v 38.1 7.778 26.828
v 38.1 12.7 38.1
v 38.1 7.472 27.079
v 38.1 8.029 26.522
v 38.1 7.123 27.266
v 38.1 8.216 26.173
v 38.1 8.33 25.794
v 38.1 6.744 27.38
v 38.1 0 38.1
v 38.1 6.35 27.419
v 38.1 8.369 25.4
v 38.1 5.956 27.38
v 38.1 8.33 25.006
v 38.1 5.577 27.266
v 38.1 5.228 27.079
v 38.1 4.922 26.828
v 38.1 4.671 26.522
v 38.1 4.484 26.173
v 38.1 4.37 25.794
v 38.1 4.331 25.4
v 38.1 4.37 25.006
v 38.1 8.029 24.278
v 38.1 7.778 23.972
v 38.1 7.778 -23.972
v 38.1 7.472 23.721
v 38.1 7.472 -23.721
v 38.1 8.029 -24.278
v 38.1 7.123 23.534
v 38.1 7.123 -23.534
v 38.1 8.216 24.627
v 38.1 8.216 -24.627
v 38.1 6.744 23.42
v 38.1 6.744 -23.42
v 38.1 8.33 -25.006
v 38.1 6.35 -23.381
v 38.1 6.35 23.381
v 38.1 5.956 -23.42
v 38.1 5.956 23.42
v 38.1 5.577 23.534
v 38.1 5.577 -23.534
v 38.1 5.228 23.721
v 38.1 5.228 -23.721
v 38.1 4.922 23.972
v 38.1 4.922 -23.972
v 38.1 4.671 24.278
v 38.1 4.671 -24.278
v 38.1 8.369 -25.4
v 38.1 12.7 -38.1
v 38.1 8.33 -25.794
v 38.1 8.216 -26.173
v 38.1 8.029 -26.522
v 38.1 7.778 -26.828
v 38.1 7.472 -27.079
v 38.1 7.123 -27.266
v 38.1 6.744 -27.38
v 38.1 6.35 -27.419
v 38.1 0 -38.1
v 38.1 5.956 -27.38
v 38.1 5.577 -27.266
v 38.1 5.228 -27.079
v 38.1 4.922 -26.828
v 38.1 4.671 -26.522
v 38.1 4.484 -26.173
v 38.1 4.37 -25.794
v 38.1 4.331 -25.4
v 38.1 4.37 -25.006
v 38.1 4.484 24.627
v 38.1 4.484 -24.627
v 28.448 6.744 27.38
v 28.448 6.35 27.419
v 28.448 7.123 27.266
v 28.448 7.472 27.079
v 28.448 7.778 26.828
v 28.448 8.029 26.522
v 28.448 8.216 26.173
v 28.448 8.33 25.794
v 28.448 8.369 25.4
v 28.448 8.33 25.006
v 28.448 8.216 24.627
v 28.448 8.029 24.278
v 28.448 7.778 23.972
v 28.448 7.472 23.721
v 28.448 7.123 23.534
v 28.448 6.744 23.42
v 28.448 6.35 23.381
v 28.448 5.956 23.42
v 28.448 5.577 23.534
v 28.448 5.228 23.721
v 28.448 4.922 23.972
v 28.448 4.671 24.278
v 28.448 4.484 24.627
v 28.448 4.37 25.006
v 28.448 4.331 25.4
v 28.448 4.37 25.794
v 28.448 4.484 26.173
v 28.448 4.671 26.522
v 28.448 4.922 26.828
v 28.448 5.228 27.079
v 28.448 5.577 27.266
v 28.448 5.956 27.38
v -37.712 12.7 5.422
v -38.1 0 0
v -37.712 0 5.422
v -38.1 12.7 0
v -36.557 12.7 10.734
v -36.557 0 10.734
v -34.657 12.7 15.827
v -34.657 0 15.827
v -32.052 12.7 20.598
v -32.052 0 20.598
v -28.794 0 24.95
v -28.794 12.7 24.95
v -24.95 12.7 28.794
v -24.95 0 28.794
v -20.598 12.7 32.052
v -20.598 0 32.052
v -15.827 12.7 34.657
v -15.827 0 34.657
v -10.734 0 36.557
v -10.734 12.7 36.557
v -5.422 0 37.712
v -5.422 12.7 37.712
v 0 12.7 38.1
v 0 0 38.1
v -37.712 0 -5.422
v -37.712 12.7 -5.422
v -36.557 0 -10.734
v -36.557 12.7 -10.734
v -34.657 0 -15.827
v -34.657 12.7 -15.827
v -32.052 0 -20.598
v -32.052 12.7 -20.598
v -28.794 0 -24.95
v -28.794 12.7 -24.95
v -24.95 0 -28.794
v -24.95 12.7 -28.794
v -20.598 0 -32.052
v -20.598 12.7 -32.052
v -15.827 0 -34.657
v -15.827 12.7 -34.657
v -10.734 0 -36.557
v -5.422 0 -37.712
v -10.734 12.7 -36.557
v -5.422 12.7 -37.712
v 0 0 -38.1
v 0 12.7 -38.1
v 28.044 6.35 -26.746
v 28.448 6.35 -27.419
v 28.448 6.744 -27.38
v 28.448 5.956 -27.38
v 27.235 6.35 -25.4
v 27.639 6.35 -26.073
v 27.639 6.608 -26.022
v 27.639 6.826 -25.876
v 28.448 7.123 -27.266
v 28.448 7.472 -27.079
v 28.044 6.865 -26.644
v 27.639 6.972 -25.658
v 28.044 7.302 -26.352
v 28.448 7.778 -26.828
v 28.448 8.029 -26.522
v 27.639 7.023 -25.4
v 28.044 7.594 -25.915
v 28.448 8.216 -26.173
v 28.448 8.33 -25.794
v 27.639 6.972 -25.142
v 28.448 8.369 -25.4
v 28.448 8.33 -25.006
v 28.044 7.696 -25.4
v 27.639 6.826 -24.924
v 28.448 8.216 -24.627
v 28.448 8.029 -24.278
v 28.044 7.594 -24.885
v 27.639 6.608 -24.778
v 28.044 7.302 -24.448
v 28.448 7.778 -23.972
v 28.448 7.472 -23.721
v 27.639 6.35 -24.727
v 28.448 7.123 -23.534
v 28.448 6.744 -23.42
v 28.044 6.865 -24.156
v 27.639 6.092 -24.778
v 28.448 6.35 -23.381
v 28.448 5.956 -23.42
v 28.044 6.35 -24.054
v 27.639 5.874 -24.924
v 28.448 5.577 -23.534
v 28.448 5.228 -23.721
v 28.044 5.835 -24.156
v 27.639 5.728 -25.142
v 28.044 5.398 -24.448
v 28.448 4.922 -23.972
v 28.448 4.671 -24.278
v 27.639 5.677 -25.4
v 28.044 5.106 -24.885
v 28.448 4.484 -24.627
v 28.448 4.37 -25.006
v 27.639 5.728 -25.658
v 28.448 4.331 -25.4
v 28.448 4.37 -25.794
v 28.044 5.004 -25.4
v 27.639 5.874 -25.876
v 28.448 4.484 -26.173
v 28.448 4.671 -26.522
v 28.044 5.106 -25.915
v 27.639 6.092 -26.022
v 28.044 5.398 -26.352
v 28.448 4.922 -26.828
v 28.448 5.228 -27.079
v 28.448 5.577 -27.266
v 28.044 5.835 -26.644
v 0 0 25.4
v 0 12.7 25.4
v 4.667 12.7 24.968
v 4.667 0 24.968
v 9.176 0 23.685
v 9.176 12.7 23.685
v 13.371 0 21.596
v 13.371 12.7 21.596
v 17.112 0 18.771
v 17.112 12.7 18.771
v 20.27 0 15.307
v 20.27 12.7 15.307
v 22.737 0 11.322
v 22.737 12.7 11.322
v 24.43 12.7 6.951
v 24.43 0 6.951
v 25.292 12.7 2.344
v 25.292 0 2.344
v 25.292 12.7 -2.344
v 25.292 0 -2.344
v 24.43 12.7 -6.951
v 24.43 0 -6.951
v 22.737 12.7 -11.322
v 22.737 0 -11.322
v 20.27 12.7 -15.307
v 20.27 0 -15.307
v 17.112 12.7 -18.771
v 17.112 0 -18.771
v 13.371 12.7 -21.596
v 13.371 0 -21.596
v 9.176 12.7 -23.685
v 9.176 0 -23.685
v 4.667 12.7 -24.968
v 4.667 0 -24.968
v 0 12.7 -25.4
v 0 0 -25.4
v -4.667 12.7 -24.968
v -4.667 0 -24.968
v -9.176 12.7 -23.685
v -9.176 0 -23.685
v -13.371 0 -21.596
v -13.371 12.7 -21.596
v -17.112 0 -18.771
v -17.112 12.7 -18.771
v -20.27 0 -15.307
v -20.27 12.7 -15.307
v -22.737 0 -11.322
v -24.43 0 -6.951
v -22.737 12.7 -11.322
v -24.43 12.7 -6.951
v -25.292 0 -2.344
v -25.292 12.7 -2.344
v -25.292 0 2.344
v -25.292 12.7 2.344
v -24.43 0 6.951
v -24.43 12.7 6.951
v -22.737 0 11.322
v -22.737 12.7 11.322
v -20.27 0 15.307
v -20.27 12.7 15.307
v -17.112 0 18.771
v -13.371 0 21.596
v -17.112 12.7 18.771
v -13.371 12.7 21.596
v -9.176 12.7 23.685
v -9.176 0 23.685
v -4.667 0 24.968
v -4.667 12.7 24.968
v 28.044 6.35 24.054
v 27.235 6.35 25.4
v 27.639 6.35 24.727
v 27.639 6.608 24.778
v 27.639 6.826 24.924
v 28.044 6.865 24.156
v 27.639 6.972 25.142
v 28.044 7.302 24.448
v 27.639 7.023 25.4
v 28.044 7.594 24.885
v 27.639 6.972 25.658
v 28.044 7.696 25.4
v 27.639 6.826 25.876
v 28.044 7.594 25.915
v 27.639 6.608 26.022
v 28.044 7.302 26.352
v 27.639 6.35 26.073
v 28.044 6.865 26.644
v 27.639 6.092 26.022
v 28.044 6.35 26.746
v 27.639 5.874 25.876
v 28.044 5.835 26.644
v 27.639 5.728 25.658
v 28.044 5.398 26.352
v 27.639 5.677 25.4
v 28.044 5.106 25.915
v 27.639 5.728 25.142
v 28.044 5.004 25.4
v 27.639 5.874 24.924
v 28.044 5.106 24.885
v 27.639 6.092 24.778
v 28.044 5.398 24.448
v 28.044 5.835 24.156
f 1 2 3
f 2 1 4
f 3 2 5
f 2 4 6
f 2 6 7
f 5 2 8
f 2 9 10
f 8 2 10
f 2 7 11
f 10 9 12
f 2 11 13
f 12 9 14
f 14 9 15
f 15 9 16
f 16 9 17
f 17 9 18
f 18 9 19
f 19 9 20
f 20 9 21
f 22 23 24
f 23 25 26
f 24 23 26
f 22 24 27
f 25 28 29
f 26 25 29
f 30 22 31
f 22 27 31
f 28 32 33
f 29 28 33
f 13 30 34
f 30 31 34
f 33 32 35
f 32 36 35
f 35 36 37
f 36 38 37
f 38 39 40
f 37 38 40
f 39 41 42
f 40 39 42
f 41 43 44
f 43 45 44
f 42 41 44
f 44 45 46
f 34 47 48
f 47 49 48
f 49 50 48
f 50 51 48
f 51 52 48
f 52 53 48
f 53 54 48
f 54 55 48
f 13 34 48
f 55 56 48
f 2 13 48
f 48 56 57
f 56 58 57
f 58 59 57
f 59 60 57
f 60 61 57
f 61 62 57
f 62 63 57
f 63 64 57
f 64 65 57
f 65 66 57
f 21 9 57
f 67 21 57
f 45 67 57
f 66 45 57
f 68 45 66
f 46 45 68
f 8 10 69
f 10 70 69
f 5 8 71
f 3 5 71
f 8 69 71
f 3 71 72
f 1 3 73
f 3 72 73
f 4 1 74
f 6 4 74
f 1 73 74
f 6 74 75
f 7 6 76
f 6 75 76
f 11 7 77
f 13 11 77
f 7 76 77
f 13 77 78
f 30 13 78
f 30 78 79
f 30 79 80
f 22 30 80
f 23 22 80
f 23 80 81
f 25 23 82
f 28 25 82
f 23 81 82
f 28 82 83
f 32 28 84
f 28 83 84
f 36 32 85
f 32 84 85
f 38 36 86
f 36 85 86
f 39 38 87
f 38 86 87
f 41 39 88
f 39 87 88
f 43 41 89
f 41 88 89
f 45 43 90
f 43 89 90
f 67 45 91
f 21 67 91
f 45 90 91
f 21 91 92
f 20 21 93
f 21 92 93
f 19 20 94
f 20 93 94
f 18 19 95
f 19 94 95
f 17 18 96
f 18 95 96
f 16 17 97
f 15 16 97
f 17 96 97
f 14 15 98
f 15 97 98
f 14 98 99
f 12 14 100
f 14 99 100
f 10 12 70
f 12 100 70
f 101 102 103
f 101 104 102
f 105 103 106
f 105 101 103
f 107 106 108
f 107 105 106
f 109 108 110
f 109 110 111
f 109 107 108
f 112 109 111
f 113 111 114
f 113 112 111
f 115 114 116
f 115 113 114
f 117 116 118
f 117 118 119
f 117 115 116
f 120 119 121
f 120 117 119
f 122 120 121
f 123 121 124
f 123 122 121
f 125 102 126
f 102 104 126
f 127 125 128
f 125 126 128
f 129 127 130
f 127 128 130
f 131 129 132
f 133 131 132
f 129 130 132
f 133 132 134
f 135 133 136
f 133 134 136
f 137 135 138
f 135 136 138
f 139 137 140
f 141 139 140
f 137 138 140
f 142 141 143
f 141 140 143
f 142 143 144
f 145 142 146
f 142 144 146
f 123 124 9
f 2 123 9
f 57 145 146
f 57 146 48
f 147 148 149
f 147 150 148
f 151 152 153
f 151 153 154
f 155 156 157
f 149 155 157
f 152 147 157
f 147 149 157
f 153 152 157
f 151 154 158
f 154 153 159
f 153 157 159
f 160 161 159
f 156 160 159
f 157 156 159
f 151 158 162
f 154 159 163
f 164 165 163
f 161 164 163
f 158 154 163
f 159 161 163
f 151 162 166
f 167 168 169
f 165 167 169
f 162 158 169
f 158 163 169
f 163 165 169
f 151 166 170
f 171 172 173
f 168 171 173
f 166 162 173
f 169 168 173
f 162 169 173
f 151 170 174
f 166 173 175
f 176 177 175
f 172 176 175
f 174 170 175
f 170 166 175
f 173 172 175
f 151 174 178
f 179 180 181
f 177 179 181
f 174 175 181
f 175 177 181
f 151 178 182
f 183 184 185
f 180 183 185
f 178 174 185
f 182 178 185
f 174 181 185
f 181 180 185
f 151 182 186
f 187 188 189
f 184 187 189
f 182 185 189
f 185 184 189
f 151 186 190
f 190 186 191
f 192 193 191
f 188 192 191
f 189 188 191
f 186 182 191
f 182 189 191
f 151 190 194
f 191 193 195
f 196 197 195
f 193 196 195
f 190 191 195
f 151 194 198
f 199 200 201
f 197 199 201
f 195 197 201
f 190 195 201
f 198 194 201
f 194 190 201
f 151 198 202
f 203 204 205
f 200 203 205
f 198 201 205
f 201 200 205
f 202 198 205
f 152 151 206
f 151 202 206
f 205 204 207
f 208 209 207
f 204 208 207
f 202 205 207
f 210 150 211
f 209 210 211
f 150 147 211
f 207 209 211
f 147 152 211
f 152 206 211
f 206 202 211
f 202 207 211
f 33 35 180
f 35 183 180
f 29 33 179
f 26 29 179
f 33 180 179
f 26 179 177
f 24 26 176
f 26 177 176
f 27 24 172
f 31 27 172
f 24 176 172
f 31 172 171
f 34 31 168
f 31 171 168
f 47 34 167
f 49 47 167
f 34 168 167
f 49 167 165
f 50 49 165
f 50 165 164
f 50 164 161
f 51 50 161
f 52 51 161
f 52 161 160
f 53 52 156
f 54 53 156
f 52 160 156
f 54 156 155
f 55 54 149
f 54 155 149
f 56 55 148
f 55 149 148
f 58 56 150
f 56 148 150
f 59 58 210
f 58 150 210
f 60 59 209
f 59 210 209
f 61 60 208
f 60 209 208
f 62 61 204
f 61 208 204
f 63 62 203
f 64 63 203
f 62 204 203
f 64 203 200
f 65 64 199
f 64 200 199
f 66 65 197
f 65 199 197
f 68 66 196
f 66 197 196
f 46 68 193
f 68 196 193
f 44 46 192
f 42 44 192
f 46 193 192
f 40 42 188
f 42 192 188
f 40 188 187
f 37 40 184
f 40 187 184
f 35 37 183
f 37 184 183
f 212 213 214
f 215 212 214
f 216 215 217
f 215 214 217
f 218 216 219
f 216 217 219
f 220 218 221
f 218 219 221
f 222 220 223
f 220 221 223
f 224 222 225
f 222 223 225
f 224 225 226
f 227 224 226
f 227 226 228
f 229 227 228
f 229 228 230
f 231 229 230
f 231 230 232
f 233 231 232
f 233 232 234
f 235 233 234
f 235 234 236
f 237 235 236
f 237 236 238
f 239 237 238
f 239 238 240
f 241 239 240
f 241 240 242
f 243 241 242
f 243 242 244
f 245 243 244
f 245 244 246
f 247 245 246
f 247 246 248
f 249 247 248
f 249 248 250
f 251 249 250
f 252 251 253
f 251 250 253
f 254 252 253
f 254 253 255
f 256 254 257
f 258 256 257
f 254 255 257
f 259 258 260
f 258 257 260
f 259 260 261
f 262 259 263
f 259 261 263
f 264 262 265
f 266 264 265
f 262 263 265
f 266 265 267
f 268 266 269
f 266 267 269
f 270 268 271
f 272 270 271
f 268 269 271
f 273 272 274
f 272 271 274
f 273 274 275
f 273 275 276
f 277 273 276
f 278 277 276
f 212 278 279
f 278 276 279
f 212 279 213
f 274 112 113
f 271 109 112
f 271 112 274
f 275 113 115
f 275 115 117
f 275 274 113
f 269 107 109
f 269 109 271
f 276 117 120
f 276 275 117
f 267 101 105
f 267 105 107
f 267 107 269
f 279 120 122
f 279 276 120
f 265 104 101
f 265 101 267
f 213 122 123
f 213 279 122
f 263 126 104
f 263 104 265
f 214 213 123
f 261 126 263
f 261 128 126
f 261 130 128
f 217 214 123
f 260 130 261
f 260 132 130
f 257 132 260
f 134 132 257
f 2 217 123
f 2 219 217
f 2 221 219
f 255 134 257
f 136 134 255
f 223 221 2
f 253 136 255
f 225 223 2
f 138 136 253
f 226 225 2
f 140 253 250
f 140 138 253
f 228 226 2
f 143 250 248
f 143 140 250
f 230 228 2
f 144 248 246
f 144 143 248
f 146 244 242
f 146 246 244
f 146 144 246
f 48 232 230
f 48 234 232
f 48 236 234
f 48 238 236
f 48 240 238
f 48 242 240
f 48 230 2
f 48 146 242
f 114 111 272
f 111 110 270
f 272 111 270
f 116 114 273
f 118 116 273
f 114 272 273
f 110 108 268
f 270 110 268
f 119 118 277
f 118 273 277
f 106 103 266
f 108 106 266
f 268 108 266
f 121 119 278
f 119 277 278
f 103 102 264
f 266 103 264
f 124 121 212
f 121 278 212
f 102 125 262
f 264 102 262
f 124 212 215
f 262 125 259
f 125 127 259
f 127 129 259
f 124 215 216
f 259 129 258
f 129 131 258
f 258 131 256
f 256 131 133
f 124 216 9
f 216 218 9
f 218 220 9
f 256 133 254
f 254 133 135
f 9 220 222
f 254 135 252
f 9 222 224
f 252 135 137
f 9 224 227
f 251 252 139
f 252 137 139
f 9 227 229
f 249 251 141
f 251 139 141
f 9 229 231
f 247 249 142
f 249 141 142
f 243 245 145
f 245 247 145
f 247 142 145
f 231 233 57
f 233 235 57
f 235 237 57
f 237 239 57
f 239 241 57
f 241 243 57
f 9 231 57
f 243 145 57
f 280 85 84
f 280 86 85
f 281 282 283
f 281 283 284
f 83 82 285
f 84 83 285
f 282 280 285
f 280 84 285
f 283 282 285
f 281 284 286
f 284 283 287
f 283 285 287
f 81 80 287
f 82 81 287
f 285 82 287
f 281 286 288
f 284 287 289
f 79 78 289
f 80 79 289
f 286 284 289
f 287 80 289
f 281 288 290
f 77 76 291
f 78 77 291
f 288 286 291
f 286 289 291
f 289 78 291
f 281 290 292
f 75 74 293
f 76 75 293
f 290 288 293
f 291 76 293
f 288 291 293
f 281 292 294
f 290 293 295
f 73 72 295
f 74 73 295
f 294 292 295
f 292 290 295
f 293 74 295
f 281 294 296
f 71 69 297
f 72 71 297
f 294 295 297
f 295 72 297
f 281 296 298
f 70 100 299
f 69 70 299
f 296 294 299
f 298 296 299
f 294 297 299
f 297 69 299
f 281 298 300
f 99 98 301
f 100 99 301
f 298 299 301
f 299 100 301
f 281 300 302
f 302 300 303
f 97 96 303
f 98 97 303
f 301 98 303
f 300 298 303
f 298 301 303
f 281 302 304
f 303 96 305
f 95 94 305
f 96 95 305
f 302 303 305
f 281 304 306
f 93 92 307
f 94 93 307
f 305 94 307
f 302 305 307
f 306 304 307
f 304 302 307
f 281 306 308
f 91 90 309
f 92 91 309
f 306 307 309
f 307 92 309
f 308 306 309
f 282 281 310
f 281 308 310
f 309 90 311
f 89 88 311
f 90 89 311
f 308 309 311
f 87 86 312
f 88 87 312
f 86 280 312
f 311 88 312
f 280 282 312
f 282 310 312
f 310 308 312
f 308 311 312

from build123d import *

# Parameters (mm, degrees)
SKETCH1_W                  = 76.2
SKETCH1_H                  = 76.2
BOSS_EXTRUDE1_DEPTH        = 12.7
F_10_32_TAPPED_HOLE1_D     = 4.0386
F_10_32_TAPPED_HOLE1_DEPTH = 9.652
F_10_32_TAPPED_HOLE1_TIP   = 1.213317848
SKETCH9_R                  = 25.4
CUT_EXTRUDE2_DEPTH         = 56.358016583
FILLET1_R                  = 38.1


with BuildPart() as part:
    # Sketch1 → Boss-Extrude1 (new body)
    with BuildSketch(Plane(origin=(0, 0, 0), x_dir=(1, 0, 0), z_dir=(0, 1, 0))):
        Rectangle(SKETCH1_W, SKETCH1_H)
    extrude(amount=BOSS_EXTRUDE1_DEPTH)

    # #10-32 Tapped Hole1
    with Locations(Plane(origin=(38.1, 0, 0), x_dir=(0, 0, -1), z_dir=(1, 0, 0))):
        with Locations((-25.4, 6.35), (25.4, 6.35)):
            Hole(F_10_32_TAPPED_HOLE1_D / 2, depth=F_10_32_TAPPED_HOLE1_DEPTH)
            with Locations((0, 0, -(F_10_32_TAPPED_HOLE1_DEPTH + F_10_32_TAPPED_HOLE1_TIP / 2))):  # 118° drill point
                Cone(0, F_10_32_TAPPED_HOLE1_D / 2, F_10_32_TAPPED_HOLE1_TIP, mode=Mode.SUBTRACT)

    # Sketch9 → Cut-Extrude2 (cut, through all)
    with BuildSketch(Plane(origin=(0, 12.7, 0), x_dir=(1, 0, 0), z_dir=(0, 1, 0))):
        with Locations(Location((0, 0, 0), (0, 0, 270))):
            Circle(SKETCH9_R)
    extrude(amount=-CUT_EXTRUDE2_DEPTH, mode=Mode.SUBTRACT)

    # Fillet1
    fillet1_edges = [part.edges().sort_by_distance(p)[0] for p in [
        (-38.1, 6.35, -38.1),
        (-38.1, 6.35, 38.1),
    ]]
    fillet(fillet1_edges, radius=FILLET1_R - 0.0001)  # a hair under: the kernel refuses the full size


solid = part.part
